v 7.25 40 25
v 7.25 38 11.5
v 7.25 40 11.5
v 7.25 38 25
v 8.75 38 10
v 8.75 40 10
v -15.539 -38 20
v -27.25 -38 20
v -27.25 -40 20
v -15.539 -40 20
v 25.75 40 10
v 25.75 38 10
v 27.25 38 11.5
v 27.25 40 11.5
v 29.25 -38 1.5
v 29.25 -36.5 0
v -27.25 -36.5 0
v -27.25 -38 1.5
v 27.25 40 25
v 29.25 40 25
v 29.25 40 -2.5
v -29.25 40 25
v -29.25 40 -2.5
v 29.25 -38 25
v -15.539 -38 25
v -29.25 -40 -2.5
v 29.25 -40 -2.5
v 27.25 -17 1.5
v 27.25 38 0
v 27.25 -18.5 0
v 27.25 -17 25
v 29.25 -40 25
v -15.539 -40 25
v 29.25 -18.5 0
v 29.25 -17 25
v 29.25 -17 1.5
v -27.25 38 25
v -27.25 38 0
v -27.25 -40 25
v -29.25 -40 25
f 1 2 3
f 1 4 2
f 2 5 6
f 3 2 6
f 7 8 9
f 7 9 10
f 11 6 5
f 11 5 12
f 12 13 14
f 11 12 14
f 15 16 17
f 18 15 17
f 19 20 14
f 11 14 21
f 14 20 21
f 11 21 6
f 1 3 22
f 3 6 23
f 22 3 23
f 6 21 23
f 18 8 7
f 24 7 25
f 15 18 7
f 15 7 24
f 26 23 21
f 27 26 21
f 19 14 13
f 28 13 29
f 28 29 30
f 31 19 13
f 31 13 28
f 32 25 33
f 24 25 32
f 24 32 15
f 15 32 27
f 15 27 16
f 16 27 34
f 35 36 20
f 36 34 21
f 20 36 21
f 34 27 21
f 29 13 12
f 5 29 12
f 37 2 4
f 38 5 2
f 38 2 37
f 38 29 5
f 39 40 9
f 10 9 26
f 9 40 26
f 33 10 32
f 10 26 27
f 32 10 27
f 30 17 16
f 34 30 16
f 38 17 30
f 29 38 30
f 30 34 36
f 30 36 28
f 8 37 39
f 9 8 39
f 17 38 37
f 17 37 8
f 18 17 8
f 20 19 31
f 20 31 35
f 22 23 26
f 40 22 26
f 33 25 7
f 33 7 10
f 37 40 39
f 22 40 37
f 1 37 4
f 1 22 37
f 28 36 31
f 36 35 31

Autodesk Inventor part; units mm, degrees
ref_plane "YZ Plane" through (0, 0, 0) normal (1, 0, 0) x (0, 1, 0)
ref_plane "XZ Plane" through (0, 0, 0) normal (0, 1, 0) x (-1, 0, 0)
ref_plane "XY Plane" through (0, 0, 0) normal (0, 0, 1) x (1, 0, 0)
sketch "Skizze1" plane through (0, 0, 0) normal (0, 0, 1) x (1, 0, 0)
  line L0 (-27.25, -38) -> (27.25, -38)
  line L1 (27.25, -38) -> (27.25, 38)
  line L2 (27.25, 38) -> (-27.25, 38)
  line L3 (-27.25, 38) -> (-27.25, -38)
  line L4 (-27.25, -38) -> (27.25, 38) construction
  line L5 (27.25, -38) -> (-27.25, 38) construction
  line L6 (-29.25, -40) -> (29.25, -40)
  line L7 (29.25, -40) -> (29.25, 40)
  line L8 (29.25, 40) -> (-29.25, 40)
  line L9 (-29.25, 40) -> (-29.25, -40)
  line L10 (-29.25, -40) -> (29.25, 40) construction
  line L11 (29.25, -40) -> (-29.25, 40) construction
  point P0 (0, 0)
  dimension "d0" = 54.5
  dimension "d1" = 76
  dimension "d2" = 2
  dimension "d3" = 2
extrude "Extrusion1" add sketch "Skizze1" against normal blind 2.5 contours L3 L2 L1 L0 | L9 L8 L7 L6
extrude "Extrusion2" add sketch "Skizze1" along normal blind 25
sketch "Skizze2" plane through (0, 0, 25) normal (0, 0, 1) x (1, 0, 0)
  line L0 (27.25, -38) -> (-27.25, -38) projected
  line L1 (27.25, 38) -> (27.25, -38) projected
  line L2 (29.25, -40) -> (29.25, 40) projected
  line L3 (29.25, 40) -> (-29.25, 40) projected
  line L4 (-27.25, 38) -> (27.25, 38) projected
  line L5 (-29.25, -40) -> (29.25, -40) projected
  line L6 (27.25, -38) -> (27.25, 38) projected
  line L7 (29.25, 40) -> (29.25, -40) projected
  line L8 (27.25, -38) -> (29.25, -38)
  line L9 (29.25, -38) -> (29.25, -17)
  line L10 (29.25, -17) -> (27.25, -17)
  line L11 (27.25, -17) -> (27.25, -38)
  point P0 (0, 0)
  dimension "d8" = 21
extrude "Extrusion3" cut sketch "Skizze2" against normal up to surface (25 mm away)
sketch "Skizze3" plane through (0, 0, 25) normal (0, 0, 1) x (1, 0, 0)
  line L0 (-27.25, 38) -> (27.25, 38) projected
  line L1 (29.25, 40) -> (-29.25, 40) projected
  line L2 (27.25, 38) -> (27.25, -17) projected
  line L3 (27.25, 38) -> (7.25, 38)
  line L4 (7.25, 38) -> (7.25, 40)
  line L5 (7.25, 40) -> (27.25, 40)
  line L6 (27.25, 40) -> (27.25, 38)
  point P0 (0, 0)
  dimension "d11" = 20
extrude "Extrusion4" cut sketch "Skizze3" against normal blind 15
chamfer "Fase1" distance 1.5 angle 45 4 edges at (28.25, -17, 0) (1, -38, 0) (7.25, 39, 10) (27.25, 39, 10)
sketch "Skizze4" plane through (0, 0, 25) normal (0, 0, 1) x (1, 0, 0)
  line L0 (-27.25, -38) -> (-27.25, 38) projected
  line L1 (29.25, -38) -> (-27.25, -38) projected
  line L2 (-29.25, -40) -> (29.25, -40) projected
  line L3 (-27.25, -38) -> (29.25, -38) projected
  line L4 (-27.25, -38) -> (-27.25, -40)
  line L5 (29.25, -40) -> (-29.25, -40) projected
  line L6 (-27.25, -40) -> (-15.5394, -40)
  line L7 (-15.5394, -38) -> (-15.5394, -40)
  line L8 (-15.5394, -38) -> (-27.25, -38)
  point P0 (0, 0)
  dimension "d17" = 11.7106
extrude "Extrusion5" cut sketch "Skizze4" against normal blind 5
equation "\"d3\" = d2"
properties part number "housing-lvl-bottom" material "ABS-Kunststoff"
